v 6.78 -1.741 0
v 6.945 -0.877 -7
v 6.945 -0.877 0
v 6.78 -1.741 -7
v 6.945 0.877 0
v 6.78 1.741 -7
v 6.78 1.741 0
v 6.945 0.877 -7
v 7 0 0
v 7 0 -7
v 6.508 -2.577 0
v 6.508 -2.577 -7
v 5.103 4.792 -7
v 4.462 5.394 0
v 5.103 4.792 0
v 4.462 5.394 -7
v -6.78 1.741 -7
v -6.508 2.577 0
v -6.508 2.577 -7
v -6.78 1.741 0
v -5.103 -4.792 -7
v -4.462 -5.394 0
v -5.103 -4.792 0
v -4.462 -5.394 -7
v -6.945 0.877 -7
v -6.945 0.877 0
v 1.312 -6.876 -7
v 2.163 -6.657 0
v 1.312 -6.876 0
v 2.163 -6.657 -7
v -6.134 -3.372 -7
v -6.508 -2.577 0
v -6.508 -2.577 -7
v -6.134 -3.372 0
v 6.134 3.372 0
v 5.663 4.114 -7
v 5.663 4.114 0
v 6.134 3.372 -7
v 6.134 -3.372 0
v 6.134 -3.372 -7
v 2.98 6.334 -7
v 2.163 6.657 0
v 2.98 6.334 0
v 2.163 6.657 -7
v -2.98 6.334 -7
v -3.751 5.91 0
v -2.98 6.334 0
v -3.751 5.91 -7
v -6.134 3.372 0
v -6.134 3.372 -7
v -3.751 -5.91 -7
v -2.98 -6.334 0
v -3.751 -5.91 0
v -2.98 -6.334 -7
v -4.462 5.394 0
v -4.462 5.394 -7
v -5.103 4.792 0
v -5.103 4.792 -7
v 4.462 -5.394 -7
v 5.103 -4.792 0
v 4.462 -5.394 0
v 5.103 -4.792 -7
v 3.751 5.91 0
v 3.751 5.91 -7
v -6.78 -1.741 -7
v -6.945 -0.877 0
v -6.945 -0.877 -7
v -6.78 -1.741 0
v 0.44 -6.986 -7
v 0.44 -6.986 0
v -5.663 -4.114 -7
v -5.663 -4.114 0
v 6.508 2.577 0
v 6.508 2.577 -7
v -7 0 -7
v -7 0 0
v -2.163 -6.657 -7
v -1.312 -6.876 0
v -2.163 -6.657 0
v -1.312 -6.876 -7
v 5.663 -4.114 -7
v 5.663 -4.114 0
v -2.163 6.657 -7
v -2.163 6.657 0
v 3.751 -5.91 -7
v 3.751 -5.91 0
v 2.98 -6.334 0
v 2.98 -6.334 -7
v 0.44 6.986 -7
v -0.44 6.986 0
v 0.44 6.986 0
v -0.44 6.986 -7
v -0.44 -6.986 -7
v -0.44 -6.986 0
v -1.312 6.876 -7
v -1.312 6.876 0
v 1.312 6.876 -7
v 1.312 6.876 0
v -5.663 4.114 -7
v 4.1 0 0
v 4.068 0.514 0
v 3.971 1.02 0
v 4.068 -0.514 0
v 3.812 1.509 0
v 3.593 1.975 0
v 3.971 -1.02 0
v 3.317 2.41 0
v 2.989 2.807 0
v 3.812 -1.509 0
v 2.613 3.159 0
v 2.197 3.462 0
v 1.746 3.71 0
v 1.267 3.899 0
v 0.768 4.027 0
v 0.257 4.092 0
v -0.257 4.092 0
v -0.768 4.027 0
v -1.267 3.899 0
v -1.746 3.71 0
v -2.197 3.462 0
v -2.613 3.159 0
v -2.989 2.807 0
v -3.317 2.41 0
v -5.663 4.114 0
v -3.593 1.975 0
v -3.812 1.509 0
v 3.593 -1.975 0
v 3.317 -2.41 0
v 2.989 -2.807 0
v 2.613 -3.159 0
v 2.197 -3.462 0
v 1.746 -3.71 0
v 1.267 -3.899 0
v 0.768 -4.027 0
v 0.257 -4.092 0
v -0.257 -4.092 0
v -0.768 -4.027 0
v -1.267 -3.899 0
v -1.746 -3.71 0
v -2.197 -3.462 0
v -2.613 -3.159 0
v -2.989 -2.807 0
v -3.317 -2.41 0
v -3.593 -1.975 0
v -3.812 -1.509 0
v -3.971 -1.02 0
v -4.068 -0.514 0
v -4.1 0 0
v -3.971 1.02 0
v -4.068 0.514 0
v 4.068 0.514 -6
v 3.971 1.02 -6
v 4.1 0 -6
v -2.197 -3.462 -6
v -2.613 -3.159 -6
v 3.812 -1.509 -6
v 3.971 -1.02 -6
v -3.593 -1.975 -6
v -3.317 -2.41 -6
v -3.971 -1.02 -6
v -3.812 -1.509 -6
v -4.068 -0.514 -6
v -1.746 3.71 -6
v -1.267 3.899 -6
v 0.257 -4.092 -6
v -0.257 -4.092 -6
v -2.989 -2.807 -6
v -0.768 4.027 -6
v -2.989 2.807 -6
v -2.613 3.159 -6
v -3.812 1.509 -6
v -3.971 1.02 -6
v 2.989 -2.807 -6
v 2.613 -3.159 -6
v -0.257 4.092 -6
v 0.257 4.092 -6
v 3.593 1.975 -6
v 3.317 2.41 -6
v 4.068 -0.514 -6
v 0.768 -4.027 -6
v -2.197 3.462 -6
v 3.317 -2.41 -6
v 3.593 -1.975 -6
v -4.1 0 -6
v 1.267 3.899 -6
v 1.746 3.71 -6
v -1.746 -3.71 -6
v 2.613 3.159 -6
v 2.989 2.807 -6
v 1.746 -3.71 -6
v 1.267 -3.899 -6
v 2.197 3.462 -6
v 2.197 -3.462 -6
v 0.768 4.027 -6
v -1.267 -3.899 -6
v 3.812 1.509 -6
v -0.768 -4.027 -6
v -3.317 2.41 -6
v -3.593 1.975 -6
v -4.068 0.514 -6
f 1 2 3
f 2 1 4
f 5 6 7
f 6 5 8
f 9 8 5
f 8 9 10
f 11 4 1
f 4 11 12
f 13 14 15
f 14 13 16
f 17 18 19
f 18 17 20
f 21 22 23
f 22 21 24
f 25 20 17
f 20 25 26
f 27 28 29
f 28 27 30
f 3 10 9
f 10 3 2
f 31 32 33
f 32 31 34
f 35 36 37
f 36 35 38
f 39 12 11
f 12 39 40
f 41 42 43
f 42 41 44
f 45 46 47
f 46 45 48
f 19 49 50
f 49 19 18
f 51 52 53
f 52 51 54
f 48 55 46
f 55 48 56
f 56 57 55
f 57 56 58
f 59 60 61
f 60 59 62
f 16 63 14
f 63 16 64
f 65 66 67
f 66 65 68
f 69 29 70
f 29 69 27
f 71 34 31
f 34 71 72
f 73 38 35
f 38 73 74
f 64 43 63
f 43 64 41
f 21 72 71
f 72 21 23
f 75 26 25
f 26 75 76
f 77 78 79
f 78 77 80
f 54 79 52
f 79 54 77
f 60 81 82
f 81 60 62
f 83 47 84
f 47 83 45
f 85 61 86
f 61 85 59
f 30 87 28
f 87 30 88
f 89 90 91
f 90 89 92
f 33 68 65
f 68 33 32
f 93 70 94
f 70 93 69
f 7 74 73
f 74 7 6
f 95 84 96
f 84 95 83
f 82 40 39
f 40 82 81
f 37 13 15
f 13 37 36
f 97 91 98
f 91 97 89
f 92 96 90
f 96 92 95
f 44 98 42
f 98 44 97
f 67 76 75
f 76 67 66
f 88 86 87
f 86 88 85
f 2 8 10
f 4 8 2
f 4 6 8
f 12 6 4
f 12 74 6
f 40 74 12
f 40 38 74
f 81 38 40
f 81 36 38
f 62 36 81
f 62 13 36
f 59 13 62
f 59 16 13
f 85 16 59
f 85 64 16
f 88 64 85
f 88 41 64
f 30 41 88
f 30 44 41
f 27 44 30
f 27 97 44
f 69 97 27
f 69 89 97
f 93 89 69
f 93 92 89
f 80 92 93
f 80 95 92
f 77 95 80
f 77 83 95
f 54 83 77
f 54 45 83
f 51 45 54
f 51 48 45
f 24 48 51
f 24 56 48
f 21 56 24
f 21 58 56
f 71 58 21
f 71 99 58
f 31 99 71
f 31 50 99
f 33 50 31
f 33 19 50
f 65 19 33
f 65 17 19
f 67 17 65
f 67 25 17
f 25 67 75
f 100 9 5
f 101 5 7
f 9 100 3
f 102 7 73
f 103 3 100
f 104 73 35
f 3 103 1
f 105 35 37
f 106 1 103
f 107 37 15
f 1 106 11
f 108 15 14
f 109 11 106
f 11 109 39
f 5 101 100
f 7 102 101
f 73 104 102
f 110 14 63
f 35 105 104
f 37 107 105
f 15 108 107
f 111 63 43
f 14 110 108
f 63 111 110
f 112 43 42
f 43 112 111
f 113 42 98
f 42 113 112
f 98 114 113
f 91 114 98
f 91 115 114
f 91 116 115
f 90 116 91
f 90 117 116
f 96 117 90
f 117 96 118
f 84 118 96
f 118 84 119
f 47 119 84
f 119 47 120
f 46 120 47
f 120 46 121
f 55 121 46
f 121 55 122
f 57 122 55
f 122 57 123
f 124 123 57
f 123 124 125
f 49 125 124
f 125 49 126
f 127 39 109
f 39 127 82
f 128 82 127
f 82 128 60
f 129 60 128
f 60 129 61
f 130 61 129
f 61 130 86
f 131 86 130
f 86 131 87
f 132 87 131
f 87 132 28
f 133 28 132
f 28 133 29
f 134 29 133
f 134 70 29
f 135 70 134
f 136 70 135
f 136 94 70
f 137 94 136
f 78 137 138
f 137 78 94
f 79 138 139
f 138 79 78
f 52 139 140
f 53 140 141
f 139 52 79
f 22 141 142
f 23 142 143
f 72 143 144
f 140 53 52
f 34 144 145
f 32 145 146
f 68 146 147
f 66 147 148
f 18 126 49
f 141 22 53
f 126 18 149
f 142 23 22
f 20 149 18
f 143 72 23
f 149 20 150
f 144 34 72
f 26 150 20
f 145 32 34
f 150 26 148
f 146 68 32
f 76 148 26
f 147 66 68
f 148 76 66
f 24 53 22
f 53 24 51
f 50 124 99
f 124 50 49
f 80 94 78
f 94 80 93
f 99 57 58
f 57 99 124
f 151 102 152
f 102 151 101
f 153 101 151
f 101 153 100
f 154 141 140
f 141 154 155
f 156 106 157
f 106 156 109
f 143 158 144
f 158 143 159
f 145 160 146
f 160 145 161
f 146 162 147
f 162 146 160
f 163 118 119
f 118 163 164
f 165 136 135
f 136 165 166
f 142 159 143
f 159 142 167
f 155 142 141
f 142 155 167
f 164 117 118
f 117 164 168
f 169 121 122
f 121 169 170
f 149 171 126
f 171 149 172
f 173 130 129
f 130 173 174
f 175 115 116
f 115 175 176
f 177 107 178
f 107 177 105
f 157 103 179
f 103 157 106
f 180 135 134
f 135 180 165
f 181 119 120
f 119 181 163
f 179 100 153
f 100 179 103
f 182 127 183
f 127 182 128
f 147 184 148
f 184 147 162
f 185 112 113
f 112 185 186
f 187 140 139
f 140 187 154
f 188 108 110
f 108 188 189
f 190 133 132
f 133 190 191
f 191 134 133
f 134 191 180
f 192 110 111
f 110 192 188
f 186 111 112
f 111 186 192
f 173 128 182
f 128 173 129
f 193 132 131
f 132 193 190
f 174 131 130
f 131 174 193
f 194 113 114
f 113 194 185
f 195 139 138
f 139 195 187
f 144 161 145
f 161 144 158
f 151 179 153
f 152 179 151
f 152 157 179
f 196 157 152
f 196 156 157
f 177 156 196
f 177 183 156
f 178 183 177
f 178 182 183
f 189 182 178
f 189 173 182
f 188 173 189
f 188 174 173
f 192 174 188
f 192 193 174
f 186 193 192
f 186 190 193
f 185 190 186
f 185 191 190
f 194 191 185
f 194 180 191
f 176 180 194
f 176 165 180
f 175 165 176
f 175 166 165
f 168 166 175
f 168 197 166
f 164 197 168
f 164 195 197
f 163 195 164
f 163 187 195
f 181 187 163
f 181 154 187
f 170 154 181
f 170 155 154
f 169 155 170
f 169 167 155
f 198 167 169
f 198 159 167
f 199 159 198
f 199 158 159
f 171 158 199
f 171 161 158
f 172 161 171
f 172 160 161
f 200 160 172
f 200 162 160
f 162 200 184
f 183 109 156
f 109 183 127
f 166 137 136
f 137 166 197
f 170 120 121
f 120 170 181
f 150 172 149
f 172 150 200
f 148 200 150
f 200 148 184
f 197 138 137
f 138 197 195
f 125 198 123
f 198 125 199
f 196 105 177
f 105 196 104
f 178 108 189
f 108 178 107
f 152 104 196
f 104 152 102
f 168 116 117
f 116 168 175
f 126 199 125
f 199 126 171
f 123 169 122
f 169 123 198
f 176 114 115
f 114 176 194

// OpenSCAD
$fn = 50;


difference() {
	union() {
		translate(v = [0, 0, -7.0000000000]) {
			cylinder(h = 7, r = 7.0000000000);
		}
	}
	union() {
		#translate(v = [0, 0, -6.0000000000]) {
			cylinder(h = 6, r = 4.1000000000);
		}
	}
}
